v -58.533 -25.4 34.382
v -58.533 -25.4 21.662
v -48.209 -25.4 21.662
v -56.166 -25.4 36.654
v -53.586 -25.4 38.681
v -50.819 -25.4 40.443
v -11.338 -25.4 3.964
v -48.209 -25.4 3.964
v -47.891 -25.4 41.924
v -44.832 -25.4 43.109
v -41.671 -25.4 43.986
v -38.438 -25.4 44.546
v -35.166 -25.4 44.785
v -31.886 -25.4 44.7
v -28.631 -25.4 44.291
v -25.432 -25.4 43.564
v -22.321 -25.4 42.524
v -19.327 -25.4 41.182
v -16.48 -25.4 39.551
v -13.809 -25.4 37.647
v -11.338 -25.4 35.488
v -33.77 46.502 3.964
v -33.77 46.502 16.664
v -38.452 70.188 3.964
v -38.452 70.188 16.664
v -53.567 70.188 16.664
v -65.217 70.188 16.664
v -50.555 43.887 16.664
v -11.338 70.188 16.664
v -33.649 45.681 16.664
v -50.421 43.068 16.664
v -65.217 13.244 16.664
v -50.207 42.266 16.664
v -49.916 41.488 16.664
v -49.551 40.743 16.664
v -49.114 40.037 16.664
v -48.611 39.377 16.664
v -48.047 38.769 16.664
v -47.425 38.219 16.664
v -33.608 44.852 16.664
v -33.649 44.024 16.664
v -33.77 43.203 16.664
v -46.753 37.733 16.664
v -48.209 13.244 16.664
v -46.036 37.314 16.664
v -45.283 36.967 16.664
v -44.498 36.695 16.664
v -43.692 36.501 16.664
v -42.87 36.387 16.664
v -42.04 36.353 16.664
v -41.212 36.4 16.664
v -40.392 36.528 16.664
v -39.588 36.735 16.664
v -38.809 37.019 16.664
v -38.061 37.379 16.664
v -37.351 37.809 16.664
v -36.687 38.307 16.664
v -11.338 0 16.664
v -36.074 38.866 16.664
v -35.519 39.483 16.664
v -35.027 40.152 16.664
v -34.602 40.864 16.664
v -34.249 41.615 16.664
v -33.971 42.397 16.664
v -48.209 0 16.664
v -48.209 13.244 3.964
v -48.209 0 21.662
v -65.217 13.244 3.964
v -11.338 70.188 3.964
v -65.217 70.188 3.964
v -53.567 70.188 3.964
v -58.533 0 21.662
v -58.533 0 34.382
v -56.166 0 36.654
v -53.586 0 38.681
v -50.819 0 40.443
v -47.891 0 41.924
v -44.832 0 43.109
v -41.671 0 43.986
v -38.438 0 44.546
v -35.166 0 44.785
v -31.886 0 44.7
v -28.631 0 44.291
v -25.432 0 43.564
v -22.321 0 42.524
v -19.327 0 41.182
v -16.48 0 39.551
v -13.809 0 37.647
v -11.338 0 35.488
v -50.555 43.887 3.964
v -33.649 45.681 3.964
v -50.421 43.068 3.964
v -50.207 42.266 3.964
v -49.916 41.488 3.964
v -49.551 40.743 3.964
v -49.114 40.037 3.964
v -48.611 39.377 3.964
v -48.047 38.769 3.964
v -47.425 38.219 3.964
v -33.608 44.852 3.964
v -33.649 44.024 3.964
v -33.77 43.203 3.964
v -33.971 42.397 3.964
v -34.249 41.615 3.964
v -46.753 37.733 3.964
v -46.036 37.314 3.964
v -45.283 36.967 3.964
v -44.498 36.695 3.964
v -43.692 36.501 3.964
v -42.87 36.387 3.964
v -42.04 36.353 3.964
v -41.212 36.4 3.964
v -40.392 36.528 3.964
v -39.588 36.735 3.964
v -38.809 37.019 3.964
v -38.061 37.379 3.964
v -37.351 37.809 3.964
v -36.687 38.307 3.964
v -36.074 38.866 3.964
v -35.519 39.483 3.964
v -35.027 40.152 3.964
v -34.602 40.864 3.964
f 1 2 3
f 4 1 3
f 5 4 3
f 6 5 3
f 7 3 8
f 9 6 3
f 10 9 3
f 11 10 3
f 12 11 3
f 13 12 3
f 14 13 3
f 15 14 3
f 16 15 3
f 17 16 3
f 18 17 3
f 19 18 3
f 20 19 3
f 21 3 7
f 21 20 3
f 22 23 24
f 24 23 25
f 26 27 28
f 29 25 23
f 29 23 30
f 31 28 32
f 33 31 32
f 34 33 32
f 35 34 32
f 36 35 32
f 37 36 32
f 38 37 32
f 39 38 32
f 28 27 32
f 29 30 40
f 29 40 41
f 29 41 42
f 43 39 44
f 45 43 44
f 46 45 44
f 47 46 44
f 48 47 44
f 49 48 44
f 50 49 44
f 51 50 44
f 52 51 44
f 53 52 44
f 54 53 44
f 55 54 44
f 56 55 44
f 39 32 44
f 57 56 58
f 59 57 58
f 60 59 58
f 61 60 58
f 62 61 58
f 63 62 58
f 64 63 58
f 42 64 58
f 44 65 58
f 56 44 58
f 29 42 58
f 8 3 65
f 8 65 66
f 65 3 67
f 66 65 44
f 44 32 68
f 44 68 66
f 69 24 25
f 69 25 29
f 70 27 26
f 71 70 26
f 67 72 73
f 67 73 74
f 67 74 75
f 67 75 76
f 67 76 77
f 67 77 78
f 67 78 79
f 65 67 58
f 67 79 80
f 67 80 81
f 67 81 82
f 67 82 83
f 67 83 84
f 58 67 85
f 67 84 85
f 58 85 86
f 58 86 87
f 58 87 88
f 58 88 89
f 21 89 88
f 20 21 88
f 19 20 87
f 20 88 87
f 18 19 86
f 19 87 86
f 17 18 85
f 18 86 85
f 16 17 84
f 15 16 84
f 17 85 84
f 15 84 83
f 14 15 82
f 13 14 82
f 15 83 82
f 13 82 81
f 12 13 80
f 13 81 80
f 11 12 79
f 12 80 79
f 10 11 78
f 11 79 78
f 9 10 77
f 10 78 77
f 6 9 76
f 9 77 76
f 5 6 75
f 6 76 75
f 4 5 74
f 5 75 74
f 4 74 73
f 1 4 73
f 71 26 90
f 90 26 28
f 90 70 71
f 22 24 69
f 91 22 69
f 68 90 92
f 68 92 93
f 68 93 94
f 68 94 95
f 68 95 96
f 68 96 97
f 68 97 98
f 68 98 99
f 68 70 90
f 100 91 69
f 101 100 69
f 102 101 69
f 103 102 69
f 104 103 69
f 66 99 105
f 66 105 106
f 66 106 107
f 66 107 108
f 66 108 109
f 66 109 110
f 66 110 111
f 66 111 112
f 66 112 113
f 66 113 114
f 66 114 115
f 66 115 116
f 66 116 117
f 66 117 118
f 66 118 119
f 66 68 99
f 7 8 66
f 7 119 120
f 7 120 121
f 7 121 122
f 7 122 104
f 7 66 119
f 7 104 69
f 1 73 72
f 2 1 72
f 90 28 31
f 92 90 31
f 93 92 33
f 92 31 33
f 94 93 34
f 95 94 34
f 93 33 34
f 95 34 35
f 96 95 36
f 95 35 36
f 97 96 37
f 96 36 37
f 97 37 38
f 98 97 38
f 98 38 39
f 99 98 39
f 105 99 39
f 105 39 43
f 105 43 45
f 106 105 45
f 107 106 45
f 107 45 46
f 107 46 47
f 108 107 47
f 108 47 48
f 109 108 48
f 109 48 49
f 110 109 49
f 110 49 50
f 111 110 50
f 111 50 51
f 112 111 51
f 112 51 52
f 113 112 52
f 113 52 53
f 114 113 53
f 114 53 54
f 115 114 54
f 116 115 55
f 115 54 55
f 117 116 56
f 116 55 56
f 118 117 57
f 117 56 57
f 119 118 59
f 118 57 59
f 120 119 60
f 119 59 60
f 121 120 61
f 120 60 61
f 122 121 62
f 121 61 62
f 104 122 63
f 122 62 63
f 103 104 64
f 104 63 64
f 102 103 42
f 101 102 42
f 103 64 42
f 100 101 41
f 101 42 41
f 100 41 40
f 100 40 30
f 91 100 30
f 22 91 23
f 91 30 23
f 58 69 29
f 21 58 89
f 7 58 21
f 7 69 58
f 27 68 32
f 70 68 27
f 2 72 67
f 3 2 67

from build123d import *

# Parameters (mm, degrees)
F1_DEPTH = 25.4
F3_DEPTH = 12.7
F4_W     = 17.007686
F4_H     = 13.244051
F5_DEPTH = 25.4
F7_DEPTH = 25.4


with BuildPart() as f1:
    # F0 (on Front) → F1 (new body)
    with BuildSketch(Plane.XZ):
        with BuildLine():
            Line((-11.337823, 21.661693), (-11.337823, 35.488307))
            ThreePointArc((-11.337823, 35.488307), (-35.166102, 44.785234), (-58.532663, 34.382179))
            Line((-58.532663, 34.382179), (-58.532663, 21.661693))
            Line((-58.532663, 21.661693), (-48.20931, 21.661693))
            Line((-48.20931, 21.661693), (-48.20931, 3.963629))
            Line((-48.20931, 3.963629), (-11.337823, 3.963629))
            Line((-11.337823, 3.963629), (-11.337823, 21.661693))
        make_face()
    extrude(amount=F1_DEPTH)

    # F2 (on face) → F3 (join)
    with BuildSketch(Plane(origin=(0, 0, 3.963629), x_dir=(1, 0, 0), z_dir=(0, 0, -1))):
        Polygon((-11.337823, -70.18809), (-11.337823, 0), (-48.20931, 0), (-65.216996, 0), (-65.216996, -70.18809), align=None)
    extrude(amount=-F3_DEPTH)

    # F4 (on face) → F5 (cut)
    with BuildSketch(Plane.XY.offset(16.663629)):
        with Locations((-56.713153, 6.622025)):
            Rectangle(F4_W, F4_H)
    extrude(amount=-F5_DEPTH, mode=Mode.SUBTRACT)

    # F6 (on face) → F7 (cut)
    with BuildSketch(Plane.XY.offset(16.663629)):
        with BuildLine():
            Line((-53.567118, 70.18809), (-50.555244, 43.886501))
            ThreePointArc((-50.555244, 43.886501), (-40.800313, 36.453912), (-33.769552, 46.502318))
            Line((-33.769552, 46.502318), (-38.451883, 70.18809))
            Line((-38.451883, 70.18809), (-53.567118, 70.18809))
        make_face()
    extrude(amount=-F7_DEPTH, mode=Mode.SUBTRACT)


solid = f1.part
